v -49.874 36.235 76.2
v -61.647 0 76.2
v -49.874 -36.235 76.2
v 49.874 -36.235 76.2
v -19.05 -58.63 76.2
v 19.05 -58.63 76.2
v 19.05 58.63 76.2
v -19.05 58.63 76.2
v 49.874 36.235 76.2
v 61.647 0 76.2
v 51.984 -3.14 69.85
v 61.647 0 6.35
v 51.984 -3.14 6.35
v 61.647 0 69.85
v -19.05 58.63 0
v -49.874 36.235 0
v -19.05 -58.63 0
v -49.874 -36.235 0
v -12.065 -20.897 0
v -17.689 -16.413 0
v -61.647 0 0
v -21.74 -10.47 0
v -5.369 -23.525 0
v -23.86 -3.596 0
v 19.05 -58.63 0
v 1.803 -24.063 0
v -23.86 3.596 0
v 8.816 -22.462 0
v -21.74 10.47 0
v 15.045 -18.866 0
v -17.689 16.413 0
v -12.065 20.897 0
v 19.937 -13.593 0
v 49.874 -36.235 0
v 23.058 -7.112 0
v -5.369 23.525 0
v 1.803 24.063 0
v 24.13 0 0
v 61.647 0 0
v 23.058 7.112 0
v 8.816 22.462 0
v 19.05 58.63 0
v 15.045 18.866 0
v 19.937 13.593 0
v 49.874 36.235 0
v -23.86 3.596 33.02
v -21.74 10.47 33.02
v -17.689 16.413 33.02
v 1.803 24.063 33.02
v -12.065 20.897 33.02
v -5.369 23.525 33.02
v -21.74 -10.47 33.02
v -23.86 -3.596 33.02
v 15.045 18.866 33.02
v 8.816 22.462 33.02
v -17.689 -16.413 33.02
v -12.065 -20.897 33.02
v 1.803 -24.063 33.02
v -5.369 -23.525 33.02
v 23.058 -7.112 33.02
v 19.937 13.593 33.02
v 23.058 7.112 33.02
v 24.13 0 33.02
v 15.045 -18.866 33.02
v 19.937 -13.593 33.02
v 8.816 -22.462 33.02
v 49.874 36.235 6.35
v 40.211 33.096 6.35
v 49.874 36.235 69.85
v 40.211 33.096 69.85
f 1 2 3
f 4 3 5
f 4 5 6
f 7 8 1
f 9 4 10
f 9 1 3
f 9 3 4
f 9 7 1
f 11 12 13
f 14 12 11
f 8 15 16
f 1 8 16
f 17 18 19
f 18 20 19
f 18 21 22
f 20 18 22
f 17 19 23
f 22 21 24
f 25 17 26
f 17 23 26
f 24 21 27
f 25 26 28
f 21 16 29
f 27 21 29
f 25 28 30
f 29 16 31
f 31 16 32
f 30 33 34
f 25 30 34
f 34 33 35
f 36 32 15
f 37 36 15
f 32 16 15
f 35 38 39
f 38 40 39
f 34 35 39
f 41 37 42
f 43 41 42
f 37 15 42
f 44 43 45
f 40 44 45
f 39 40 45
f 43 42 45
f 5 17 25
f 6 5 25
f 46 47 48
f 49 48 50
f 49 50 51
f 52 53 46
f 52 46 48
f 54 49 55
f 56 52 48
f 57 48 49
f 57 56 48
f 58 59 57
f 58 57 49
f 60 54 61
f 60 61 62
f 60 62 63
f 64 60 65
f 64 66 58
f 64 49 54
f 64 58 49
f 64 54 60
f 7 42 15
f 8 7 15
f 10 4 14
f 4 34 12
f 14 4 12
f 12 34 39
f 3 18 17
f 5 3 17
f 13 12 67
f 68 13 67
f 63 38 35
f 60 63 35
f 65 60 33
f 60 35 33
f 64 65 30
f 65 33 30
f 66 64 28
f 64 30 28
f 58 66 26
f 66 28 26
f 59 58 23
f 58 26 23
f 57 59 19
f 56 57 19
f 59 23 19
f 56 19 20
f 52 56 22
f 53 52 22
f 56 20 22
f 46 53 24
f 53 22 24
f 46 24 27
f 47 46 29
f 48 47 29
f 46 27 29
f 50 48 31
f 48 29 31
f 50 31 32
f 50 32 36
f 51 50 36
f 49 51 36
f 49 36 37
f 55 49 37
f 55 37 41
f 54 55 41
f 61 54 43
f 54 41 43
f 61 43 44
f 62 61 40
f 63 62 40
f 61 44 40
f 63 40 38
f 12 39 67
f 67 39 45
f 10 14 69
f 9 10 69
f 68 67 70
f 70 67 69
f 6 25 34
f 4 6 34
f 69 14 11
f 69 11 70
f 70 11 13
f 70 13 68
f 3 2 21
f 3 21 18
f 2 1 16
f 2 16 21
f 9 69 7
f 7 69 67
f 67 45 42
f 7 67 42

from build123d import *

# Parameters (mm, degrees)
F1_DEPTH = 76.2
F2_R     = 24.13
F3_DEPTH = 33.02
F4_W     = 38.1
F4_H     = 63.5
F5_DEPTH = 10.16


with BuildPart() as f1:
    # F0 (on Top) → F1 (new body)
    with BuildSketch(Plane.XY):
        Polygon((19.05, 58.6298713832), (-19.05, 58.6298713832), (-49.8735474857, 36.2352532708), (-61.6470949714, 0), (-49.8735474857, -36.2352532708), (-19.05, -58.6298713832), (19.05, -58.6298713832), (49.8735474857, -36.2352532708), (61.6470949714, 0), (49.8735474857, 36.2352532708), align=None)
    extrude(amount=F1_DEPTH)

    # F2 (on face) → F3 (cut)
    with BuildSketch(Plane(origin=(0, 0, 0), x_dir=(1, 0, 0), z_dir=(0, 0, -1))):
        Circle(F2_R)
    extrude(amount=-F3_DEPTH, mode=Mode.SUBTRACT)

    # F4 (on face) → F5 (cut)
    with BuildSketch(Plane(origin=(55.7603212285, 18.1176266354, 0), x_dir=(-0.3090169944, 0.9510565163, 0), z_dir=(0.9510565163, 0.3090169944, 0))):
        with Locations((0, 38.1)):
            Rectangle(F4_W, F4_H)
    extrude(amount=-F5_DEPTH, mode=Mode.SUBTRACT)


solid = f1.part
